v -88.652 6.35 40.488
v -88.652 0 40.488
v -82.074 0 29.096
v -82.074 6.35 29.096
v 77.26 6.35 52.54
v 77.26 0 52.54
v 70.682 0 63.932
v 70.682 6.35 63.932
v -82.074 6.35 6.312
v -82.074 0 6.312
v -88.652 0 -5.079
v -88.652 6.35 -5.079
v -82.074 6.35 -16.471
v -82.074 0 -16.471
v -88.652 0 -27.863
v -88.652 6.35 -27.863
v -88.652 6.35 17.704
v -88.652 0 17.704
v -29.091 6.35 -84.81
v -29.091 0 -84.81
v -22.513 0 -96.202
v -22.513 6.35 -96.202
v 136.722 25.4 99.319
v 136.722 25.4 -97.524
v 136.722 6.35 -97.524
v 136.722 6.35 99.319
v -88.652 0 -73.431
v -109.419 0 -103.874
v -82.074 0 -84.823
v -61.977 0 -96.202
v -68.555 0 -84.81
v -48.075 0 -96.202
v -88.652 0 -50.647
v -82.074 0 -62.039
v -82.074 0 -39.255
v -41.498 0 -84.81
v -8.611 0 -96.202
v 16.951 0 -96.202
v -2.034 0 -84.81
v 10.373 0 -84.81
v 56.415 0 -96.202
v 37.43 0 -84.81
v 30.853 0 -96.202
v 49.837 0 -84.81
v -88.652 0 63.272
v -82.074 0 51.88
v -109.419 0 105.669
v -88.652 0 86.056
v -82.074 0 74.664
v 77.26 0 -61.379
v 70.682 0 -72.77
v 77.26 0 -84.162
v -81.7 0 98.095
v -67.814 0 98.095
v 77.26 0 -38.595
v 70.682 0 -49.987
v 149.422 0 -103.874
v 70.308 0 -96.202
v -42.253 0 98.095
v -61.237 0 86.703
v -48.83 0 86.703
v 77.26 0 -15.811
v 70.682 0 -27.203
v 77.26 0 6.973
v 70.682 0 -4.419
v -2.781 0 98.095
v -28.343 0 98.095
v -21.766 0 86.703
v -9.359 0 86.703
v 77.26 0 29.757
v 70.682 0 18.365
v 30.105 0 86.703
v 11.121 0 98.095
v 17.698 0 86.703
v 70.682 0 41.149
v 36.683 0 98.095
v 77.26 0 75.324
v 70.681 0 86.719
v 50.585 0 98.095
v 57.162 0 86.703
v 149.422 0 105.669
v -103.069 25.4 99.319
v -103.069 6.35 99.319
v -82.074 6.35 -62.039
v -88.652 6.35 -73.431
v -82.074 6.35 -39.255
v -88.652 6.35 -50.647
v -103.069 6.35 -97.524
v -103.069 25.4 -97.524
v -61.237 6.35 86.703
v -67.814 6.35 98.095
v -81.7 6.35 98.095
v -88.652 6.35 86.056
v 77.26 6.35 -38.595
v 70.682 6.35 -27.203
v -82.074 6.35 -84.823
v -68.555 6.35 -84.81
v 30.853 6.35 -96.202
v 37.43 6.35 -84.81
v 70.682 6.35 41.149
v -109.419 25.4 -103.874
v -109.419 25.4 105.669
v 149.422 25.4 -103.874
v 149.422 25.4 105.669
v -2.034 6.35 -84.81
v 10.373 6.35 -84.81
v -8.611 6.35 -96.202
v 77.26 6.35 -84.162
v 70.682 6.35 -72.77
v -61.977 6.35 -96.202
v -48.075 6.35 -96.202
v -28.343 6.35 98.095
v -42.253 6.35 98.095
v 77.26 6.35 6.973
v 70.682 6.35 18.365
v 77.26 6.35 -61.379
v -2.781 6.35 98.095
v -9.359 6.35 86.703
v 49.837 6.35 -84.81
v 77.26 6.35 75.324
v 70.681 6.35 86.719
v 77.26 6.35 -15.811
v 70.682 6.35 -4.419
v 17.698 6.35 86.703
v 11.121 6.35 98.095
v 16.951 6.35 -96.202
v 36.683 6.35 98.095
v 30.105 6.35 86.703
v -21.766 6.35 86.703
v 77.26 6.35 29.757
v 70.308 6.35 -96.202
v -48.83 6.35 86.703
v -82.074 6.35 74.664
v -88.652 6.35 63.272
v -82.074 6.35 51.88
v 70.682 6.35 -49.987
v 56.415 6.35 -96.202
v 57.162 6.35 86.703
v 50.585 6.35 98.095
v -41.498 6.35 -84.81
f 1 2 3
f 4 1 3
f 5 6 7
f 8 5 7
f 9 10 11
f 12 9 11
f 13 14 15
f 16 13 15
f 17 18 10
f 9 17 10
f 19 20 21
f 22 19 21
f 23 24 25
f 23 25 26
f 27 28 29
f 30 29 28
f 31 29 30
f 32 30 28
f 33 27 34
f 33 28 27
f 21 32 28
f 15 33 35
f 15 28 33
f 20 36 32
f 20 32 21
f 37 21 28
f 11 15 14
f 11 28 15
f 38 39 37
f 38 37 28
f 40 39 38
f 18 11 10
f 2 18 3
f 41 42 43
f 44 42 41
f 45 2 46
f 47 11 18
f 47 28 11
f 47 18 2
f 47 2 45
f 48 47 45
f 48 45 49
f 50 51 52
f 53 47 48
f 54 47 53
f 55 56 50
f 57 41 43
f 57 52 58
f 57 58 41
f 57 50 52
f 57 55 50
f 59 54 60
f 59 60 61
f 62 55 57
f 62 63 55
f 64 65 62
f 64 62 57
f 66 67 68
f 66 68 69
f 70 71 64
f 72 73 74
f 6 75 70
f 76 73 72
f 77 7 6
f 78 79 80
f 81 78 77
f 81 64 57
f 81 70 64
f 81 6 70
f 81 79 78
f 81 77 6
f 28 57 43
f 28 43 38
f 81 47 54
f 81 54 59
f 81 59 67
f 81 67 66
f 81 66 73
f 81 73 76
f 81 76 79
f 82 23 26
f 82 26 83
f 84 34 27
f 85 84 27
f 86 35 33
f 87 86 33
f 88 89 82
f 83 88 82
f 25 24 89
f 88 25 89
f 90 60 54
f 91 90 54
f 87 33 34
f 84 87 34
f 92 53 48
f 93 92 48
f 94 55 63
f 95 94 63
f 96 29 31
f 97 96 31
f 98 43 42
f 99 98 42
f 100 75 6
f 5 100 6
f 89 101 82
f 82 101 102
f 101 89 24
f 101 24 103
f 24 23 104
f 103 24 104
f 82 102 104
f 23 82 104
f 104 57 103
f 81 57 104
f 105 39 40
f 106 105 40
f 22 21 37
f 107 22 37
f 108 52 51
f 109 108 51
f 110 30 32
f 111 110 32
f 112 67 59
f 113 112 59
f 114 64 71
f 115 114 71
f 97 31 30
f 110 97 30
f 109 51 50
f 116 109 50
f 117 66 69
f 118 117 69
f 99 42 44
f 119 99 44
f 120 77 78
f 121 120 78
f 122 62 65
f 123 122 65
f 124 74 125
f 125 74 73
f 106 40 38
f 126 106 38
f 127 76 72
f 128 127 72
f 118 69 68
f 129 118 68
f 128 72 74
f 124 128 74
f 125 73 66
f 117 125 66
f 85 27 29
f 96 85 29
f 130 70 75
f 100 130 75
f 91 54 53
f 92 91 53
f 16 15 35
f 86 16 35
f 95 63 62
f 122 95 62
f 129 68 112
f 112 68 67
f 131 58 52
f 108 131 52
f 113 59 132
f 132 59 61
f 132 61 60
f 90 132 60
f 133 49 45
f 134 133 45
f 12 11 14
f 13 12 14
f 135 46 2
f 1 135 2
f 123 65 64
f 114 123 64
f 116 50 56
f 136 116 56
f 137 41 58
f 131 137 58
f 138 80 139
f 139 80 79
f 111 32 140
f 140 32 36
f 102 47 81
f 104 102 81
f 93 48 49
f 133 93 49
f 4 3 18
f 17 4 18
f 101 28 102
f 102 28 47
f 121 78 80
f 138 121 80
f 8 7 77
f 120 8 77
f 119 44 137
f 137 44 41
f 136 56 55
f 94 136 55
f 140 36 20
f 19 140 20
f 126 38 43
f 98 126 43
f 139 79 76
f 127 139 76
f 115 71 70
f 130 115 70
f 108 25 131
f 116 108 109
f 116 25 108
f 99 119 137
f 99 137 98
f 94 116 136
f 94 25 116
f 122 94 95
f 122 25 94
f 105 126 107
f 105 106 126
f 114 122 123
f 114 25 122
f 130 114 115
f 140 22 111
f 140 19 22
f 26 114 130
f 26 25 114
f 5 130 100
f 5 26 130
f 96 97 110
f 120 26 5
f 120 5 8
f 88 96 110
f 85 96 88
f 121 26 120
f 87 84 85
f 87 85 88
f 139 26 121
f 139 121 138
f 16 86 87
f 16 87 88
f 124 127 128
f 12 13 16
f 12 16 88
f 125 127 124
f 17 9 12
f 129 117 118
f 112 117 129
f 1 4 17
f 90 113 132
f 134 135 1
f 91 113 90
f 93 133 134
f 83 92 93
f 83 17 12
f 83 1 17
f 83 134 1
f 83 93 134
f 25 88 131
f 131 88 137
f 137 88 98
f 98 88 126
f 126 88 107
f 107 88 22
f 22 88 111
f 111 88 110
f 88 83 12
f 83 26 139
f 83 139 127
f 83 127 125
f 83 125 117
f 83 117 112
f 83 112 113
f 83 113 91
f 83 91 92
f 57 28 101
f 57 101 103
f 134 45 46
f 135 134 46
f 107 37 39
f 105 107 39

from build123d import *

# Parameters (mm, degrees)
F1_W     = 258.840755
F1_H     = 209.543214
F2_DEPTH = 25.4
F3_DEPTH = 25.4
F4_W     = 239.790755
F4_H     = 196.843214
F5_DEPTH = 19.05


with BuildPart() as f2:
    # F1 (on Front) → F2 (new body)
    with BuildSketch(Plane.XZ):
        with Locations((20.0017, 0.897209)):
            Rectangle(F1_W, F1_H)
    extrude(amount=-F2_DEPTH)

    # F0 (on Front) → F3 (cut)
    with BuildSketch(Plane.XZ):
        Polygon((-88.651664, 86.055733), (-82.07436, 74.663833), (-88.651664, 63.271933), (-82.07436, 51.880033), (-88.651664, 40.488133), (-82.07436, 29.096233), (-88.651664, 17.704333), (-82.07436, 6.312433), (-88.651664, -5.079467), (-82.07436, -16.471367), (-88.651664, -27.863267), (-82.07436, -39.255167), (-88.651664, -50.647067), (-82.07436, -62.038967), (-88.651664, -73.430867), (-82.07436, -84.822767), (-68.5546, -84.810067), (-61.977295, -96.201967), (-48.074809, -96.201967), (-41.497504, -84.810067), (-29.09062, -84.810067), (-22.513315, -96.201967), (-8.610829, -96.201967), (-2.033524, -84.810067), (10.37336, -84.810067), (16.950665, -96.201967), (30.853151, -96.201967), (37.430456, -84.810067), (49.83734, -84.810067), (56.414645, -96.201967), (70.308445, -96.201967), (77.259713, -84.162367), (70.682409, -72.770467), (77.259713, -61.378567), (70.682409, -49.986667), (77.259713, -38.594767), (70.682409, -27.202867), (77.259713, -15.810967), (70.682409, -4.419067), (77.259713, 6.972833), (70.682409, 18.364733), (77.259713, 29.756633), (70.682409, 41.148533), (77.259713, 52.540433), (70.682409, 63.932333), (77.259713, 75.324233), (70.681266, 86.718775), (57.162446, 86.703433), (50.585141, 98.095333), (36.682655, 98.095333), (30.10535, 86.703433), (17.698466, 86.703433), (11.121161, 98.095333), (-2.781325, 98.095333), (-9.35863, 86.703433), (-21.765514, 86.703433), (-28.342819, 98.095333), (-42.252925, 98.095333), (-48.83023, 86.703433), (-61.237114, 86.703433), (-67.814419, 98.095333), (-81.700395, 98.095333), align=None)
    extrude(amount=-F3_DEPTH, mode=Mode.SUBTRACT)

    # F4 (on face) → F5 (cut)
    with BuildSketch(Plane(origin=(0, 25.4, 0), x_dir=(-1, 0, 0), z_dir=(0, 1, 0))):
        with Locations((-16.826699, 0.897209)):
            Rectangle(F4_W, F4_H)
    extrude(amount=-F5_DEPTH, mode=Mode.SUBTRACT)


solid = f2.part
